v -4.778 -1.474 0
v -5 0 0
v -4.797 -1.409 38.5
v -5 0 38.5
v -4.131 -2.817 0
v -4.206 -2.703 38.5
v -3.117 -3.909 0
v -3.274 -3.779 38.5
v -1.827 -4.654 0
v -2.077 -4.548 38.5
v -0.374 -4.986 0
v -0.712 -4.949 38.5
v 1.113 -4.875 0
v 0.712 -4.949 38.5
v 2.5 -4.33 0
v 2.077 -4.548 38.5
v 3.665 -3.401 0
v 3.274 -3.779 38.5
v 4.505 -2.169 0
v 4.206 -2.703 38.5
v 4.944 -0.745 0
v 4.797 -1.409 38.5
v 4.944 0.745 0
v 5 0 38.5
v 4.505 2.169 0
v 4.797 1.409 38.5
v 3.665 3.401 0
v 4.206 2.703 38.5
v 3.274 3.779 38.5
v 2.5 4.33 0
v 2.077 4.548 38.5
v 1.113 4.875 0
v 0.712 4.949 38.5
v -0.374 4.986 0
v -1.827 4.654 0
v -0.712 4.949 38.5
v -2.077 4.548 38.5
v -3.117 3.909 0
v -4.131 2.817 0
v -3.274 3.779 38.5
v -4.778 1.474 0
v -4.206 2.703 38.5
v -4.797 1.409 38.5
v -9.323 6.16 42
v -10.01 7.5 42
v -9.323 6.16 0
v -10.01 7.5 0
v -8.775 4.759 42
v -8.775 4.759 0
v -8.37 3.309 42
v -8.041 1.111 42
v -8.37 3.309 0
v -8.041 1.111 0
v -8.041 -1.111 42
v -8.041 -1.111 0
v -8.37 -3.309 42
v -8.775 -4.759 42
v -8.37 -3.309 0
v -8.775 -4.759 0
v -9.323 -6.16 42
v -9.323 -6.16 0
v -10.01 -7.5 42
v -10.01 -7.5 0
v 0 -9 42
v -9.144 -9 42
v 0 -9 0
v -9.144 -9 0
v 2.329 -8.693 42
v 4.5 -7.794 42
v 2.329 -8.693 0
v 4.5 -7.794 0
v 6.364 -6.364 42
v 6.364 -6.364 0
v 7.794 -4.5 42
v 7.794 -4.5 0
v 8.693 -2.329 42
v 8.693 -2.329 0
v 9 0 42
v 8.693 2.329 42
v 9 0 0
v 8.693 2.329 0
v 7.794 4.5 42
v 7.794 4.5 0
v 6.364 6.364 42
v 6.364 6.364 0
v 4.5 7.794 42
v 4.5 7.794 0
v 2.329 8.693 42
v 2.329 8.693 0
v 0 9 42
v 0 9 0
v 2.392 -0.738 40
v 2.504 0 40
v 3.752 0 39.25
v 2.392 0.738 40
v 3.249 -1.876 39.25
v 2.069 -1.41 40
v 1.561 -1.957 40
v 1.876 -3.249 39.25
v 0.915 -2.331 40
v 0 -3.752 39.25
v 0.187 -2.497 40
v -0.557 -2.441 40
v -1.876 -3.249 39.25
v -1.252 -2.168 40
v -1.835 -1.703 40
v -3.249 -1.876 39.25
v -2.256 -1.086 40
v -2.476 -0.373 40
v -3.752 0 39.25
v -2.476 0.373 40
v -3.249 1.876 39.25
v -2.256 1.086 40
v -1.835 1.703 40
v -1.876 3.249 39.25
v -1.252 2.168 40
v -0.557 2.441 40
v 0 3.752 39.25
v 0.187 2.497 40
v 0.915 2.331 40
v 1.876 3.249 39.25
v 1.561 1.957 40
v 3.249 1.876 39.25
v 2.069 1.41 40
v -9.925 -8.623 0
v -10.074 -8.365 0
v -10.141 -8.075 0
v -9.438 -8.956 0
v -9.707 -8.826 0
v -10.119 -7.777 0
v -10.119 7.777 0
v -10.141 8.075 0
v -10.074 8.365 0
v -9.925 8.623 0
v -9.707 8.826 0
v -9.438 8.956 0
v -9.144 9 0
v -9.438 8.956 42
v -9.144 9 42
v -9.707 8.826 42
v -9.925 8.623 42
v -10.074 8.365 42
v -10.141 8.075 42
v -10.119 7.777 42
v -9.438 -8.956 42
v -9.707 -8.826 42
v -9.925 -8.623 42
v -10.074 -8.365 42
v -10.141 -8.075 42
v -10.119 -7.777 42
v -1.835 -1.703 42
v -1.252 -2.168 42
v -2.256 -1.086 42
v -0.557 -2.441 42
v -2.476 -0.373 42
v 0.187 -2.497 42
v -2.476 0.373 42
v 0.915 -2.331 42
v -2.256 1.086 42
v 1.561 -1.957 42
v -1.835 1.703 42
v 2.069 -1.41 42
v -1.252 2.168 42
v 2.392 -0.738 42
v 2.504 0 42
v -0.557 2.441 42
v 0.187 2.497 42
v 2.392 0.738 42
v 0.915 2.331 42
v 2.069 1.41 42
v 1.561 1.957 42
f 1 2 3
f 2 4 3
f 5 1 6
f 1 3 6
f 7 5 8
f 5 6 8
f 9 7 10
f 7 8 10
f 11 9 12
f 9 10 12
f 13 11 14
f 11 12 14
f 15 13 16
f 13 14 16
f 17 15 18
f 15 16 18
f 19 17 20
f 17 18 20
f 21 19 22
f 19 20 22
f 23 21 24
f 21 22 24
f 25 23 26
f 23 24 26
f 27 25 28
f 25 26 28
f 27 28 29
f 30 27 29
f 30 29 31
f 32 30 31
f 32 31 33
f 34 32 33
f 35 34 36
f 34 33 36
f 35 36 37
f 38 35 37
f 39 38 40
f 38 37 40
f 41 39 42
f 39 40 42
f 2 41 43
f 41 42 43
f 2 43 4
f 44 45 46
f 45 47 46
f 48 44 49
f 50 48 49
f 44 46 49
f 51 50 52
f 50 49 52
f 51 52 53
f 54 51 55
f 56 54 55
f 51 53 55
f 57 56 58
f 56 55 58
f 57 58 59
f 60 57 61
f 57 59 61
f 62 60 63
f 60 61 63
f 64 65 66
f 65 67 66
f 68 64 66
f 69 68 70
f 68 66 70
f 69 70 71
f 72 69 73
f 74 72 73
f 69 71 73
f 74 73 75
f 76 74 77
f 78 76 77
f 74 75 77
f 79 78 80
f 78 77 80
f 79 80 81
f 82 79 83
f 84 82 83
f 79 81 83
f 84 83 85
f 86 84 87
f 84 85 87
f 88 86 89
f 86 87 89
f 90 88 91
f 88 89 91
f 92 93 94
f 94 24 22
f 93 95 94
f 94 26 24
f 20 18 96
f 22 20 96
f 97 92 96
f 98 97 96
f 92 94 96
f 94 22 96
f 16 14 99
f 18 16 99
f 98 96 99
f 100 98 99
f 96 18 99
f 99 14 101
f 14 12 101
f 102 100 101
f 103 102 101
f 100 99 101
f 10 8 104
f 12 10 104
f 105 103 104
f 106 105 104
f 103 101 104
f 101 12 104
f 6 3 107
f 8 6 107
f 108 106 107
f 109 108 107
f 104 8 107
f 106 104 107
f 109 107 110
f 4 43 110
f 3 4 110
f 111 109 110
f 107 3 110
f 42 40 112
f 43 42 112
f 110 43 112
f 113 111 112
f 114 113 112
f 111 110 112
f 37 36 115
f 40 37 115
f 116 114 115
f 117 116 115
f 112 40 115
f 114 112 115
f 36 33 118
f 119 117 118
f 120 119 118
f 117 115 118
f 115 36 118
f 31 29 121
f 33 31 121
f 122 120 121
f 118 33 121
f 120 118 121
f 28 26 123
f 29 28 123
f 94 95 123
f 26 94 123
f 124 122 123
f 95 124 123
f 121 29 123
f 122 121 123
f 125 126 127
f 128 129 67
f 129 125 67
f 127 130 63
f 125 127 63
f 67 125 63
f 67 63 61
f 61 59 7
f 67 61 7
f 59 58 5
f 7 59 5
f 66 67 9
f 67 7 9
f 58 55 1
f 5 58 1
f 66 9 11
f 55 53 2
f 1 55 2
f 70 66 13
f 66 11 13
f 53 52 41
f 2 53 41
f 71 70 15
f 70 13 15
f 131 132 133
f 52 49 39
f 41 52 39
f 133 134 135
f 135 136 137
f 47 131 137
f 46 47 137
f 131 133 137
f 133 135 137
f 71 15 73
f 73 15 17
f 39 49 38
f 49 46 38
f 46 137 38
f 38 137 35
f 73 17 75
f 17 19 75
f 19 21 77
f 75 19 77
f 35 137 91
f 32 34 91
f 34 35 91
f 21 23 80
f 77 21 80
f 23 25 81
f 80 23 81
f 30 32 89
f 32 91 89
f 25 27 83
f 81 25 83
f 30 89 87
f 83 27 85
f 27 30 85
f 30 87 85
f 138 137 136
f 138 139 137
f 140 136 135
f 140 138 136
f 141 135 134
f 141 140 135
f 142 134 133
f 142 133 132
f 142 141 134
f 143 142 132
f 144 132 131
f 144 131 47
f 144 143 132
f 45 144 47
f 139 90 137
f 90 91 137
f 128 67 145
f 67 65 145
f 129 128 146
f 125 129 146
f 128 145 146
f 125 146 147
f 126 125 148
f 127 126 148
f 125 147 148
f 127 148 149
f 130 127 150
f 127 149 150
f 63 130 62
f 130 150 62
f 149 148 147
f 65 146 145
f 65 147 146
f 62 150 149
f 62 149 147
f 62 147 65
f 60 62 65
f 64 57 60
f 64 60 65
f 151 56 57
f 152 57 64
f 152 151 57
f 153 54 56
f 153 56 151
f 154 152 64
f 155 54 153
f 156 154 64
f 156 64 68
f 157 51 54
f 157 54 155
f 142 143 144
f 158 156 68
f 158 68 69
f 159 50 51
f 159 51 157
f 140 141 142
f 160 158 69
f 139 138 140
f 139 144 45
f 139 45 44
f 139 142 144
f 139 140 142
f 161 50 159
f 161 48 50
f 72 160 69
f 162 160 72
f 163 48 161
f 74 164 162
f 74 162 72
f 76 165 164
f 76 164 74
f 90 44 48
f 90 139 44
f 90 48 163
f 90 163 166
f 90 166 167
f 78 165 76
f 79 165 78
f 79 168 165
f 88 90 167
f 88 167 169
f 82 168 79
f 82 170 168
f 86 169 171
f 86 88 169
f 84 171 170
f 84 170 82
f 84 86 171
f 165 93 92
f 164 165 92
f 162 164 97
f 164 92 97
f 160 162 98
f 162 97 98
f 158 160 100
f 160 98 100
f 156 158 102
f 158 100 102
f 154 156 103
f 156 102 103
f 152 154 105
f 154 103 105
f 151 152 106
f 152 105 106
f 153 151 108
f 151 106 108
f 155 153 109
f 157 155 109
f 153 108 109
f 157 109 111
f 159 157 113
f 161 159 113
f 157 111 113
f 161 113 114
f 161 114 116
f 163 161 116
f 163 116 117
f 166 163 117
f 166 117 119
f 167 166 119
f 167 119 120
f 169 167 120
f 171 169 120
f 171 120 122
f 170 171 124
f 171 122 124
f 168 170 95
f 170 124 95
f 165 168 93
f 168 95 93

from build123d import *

# Parameters (mm, degrees)
F1_DEPTH = 40
F3_D     = 10
F3_DEPTH = 38.5
F3_TIP   = 3.0043030951
F4_DEPTH = 2
F5_R     = 1


with BuildPart() as f1:
    # F0 (on Top) → F1 (new body)
    with BuildSketch(Plane.XY):
        with BuildLine():
            ThreePointArc((0, -5), (-5, 0), (0, 5))
            Line((0, 5), (0, 9))
            ThreePointArc((0, 9), (-5.0605227038, 7.442520404), (-8.3695652174, 3.3091355475))
            ThreePointArc((-8.3695652174, 3.3091355475), (-8, 0), (-8.3695652174, -3.3091355475))
            ThreePointArc((-8.3695652174, -3.3091355475), (-5.0605227038, -7.442520404), (0, -9))
            Line((0, -9), (0, -5))
        make_face()
        with BuildLine():
            ThreePointArc((-8.3695652174, 3.3091355475), (-5.0605227038, 7.442520404), (0, 9))
            Line((0, 9), (-11, 9))
            ThreePointArc((-11, 9), (-9.3841453176, 6.2935285229), (-8.3695652174, 3.3091355475))
        make_face()
        with BuildLine():
            Line((-11, -9), (0, -9))
            ThreePointArc((0, -9), (-5.0605227038, -7.442520404), (-8.3695652174, -3.3091355475))
            ThreePointArc((-8.3695652174, -3.3091355475), (-9.3841453176, -6.2935285229), (-11, -9))
        make_face()
        with BuildLine():
            ThreePointArc((0, 5), (3.5355339059, 3.5355339059), (5, 0))
            ThreePointArc((5, 0), (3.5355339059, -3.5355339059), (0, -5))
            Line((0, -5), (0, -9))
            ThreePointArc((0, -9), (6.3639610307, -6.3639610307), (9, 0))
            ThreePointArc((9, 0), (6.3639610307, 6.3639610307), (0, 9))
            Line((0, 9), (0, 5))
        make_face()
        with BuildLine():
            Line((0, -5), (0, 5))
            ThreePointArc((0, 5), (-5, 0), (0, -5))
        make_face()
        with BuildLine():
            ThreePointArc((0, -5), (3.5355339059, -3.5355339059), (5, 0))
            ThreePointArc((5, 0), (3.5355339059, 3.5355339059), (0, 5))
            Line((0, 5), (0, -5))
        make_face()
    extrude(amount=F1_DEPTH)

    # F3
    with Locations(Plane(origin=(0, 0, 0), x_dir=(1, 0, 0), z_dir=(0, 0, -1))):
        with Locations((0, 0)):
            Hole(F3_D / 2, depth=F3_DEPTH)
            with Locations((0, 0, -(F3_DEPTH + F3_TIP / 2))):  # 118° drill point
                Cone(0, F3_D / 2, F3_TIP, mode=Mode.SUBTRACT)

    # F4 (add): a face of the model
    f4_faces = [f1.faces().sort_by_distance(p)[0] for p in [
        (-5.5, 8.7309275191, 40),
    ]]
    extrude(f4_faces, amount=F4_DEPTH)

    # F5
    f5_edges = [f1.edges().sort_by_distance(p)[0] for p in [
        (-11, -9, 21),
        (-11, 9, 21),
    ]]
    fillet(f5_edges, radius=F5_R)


solid = f1.part
